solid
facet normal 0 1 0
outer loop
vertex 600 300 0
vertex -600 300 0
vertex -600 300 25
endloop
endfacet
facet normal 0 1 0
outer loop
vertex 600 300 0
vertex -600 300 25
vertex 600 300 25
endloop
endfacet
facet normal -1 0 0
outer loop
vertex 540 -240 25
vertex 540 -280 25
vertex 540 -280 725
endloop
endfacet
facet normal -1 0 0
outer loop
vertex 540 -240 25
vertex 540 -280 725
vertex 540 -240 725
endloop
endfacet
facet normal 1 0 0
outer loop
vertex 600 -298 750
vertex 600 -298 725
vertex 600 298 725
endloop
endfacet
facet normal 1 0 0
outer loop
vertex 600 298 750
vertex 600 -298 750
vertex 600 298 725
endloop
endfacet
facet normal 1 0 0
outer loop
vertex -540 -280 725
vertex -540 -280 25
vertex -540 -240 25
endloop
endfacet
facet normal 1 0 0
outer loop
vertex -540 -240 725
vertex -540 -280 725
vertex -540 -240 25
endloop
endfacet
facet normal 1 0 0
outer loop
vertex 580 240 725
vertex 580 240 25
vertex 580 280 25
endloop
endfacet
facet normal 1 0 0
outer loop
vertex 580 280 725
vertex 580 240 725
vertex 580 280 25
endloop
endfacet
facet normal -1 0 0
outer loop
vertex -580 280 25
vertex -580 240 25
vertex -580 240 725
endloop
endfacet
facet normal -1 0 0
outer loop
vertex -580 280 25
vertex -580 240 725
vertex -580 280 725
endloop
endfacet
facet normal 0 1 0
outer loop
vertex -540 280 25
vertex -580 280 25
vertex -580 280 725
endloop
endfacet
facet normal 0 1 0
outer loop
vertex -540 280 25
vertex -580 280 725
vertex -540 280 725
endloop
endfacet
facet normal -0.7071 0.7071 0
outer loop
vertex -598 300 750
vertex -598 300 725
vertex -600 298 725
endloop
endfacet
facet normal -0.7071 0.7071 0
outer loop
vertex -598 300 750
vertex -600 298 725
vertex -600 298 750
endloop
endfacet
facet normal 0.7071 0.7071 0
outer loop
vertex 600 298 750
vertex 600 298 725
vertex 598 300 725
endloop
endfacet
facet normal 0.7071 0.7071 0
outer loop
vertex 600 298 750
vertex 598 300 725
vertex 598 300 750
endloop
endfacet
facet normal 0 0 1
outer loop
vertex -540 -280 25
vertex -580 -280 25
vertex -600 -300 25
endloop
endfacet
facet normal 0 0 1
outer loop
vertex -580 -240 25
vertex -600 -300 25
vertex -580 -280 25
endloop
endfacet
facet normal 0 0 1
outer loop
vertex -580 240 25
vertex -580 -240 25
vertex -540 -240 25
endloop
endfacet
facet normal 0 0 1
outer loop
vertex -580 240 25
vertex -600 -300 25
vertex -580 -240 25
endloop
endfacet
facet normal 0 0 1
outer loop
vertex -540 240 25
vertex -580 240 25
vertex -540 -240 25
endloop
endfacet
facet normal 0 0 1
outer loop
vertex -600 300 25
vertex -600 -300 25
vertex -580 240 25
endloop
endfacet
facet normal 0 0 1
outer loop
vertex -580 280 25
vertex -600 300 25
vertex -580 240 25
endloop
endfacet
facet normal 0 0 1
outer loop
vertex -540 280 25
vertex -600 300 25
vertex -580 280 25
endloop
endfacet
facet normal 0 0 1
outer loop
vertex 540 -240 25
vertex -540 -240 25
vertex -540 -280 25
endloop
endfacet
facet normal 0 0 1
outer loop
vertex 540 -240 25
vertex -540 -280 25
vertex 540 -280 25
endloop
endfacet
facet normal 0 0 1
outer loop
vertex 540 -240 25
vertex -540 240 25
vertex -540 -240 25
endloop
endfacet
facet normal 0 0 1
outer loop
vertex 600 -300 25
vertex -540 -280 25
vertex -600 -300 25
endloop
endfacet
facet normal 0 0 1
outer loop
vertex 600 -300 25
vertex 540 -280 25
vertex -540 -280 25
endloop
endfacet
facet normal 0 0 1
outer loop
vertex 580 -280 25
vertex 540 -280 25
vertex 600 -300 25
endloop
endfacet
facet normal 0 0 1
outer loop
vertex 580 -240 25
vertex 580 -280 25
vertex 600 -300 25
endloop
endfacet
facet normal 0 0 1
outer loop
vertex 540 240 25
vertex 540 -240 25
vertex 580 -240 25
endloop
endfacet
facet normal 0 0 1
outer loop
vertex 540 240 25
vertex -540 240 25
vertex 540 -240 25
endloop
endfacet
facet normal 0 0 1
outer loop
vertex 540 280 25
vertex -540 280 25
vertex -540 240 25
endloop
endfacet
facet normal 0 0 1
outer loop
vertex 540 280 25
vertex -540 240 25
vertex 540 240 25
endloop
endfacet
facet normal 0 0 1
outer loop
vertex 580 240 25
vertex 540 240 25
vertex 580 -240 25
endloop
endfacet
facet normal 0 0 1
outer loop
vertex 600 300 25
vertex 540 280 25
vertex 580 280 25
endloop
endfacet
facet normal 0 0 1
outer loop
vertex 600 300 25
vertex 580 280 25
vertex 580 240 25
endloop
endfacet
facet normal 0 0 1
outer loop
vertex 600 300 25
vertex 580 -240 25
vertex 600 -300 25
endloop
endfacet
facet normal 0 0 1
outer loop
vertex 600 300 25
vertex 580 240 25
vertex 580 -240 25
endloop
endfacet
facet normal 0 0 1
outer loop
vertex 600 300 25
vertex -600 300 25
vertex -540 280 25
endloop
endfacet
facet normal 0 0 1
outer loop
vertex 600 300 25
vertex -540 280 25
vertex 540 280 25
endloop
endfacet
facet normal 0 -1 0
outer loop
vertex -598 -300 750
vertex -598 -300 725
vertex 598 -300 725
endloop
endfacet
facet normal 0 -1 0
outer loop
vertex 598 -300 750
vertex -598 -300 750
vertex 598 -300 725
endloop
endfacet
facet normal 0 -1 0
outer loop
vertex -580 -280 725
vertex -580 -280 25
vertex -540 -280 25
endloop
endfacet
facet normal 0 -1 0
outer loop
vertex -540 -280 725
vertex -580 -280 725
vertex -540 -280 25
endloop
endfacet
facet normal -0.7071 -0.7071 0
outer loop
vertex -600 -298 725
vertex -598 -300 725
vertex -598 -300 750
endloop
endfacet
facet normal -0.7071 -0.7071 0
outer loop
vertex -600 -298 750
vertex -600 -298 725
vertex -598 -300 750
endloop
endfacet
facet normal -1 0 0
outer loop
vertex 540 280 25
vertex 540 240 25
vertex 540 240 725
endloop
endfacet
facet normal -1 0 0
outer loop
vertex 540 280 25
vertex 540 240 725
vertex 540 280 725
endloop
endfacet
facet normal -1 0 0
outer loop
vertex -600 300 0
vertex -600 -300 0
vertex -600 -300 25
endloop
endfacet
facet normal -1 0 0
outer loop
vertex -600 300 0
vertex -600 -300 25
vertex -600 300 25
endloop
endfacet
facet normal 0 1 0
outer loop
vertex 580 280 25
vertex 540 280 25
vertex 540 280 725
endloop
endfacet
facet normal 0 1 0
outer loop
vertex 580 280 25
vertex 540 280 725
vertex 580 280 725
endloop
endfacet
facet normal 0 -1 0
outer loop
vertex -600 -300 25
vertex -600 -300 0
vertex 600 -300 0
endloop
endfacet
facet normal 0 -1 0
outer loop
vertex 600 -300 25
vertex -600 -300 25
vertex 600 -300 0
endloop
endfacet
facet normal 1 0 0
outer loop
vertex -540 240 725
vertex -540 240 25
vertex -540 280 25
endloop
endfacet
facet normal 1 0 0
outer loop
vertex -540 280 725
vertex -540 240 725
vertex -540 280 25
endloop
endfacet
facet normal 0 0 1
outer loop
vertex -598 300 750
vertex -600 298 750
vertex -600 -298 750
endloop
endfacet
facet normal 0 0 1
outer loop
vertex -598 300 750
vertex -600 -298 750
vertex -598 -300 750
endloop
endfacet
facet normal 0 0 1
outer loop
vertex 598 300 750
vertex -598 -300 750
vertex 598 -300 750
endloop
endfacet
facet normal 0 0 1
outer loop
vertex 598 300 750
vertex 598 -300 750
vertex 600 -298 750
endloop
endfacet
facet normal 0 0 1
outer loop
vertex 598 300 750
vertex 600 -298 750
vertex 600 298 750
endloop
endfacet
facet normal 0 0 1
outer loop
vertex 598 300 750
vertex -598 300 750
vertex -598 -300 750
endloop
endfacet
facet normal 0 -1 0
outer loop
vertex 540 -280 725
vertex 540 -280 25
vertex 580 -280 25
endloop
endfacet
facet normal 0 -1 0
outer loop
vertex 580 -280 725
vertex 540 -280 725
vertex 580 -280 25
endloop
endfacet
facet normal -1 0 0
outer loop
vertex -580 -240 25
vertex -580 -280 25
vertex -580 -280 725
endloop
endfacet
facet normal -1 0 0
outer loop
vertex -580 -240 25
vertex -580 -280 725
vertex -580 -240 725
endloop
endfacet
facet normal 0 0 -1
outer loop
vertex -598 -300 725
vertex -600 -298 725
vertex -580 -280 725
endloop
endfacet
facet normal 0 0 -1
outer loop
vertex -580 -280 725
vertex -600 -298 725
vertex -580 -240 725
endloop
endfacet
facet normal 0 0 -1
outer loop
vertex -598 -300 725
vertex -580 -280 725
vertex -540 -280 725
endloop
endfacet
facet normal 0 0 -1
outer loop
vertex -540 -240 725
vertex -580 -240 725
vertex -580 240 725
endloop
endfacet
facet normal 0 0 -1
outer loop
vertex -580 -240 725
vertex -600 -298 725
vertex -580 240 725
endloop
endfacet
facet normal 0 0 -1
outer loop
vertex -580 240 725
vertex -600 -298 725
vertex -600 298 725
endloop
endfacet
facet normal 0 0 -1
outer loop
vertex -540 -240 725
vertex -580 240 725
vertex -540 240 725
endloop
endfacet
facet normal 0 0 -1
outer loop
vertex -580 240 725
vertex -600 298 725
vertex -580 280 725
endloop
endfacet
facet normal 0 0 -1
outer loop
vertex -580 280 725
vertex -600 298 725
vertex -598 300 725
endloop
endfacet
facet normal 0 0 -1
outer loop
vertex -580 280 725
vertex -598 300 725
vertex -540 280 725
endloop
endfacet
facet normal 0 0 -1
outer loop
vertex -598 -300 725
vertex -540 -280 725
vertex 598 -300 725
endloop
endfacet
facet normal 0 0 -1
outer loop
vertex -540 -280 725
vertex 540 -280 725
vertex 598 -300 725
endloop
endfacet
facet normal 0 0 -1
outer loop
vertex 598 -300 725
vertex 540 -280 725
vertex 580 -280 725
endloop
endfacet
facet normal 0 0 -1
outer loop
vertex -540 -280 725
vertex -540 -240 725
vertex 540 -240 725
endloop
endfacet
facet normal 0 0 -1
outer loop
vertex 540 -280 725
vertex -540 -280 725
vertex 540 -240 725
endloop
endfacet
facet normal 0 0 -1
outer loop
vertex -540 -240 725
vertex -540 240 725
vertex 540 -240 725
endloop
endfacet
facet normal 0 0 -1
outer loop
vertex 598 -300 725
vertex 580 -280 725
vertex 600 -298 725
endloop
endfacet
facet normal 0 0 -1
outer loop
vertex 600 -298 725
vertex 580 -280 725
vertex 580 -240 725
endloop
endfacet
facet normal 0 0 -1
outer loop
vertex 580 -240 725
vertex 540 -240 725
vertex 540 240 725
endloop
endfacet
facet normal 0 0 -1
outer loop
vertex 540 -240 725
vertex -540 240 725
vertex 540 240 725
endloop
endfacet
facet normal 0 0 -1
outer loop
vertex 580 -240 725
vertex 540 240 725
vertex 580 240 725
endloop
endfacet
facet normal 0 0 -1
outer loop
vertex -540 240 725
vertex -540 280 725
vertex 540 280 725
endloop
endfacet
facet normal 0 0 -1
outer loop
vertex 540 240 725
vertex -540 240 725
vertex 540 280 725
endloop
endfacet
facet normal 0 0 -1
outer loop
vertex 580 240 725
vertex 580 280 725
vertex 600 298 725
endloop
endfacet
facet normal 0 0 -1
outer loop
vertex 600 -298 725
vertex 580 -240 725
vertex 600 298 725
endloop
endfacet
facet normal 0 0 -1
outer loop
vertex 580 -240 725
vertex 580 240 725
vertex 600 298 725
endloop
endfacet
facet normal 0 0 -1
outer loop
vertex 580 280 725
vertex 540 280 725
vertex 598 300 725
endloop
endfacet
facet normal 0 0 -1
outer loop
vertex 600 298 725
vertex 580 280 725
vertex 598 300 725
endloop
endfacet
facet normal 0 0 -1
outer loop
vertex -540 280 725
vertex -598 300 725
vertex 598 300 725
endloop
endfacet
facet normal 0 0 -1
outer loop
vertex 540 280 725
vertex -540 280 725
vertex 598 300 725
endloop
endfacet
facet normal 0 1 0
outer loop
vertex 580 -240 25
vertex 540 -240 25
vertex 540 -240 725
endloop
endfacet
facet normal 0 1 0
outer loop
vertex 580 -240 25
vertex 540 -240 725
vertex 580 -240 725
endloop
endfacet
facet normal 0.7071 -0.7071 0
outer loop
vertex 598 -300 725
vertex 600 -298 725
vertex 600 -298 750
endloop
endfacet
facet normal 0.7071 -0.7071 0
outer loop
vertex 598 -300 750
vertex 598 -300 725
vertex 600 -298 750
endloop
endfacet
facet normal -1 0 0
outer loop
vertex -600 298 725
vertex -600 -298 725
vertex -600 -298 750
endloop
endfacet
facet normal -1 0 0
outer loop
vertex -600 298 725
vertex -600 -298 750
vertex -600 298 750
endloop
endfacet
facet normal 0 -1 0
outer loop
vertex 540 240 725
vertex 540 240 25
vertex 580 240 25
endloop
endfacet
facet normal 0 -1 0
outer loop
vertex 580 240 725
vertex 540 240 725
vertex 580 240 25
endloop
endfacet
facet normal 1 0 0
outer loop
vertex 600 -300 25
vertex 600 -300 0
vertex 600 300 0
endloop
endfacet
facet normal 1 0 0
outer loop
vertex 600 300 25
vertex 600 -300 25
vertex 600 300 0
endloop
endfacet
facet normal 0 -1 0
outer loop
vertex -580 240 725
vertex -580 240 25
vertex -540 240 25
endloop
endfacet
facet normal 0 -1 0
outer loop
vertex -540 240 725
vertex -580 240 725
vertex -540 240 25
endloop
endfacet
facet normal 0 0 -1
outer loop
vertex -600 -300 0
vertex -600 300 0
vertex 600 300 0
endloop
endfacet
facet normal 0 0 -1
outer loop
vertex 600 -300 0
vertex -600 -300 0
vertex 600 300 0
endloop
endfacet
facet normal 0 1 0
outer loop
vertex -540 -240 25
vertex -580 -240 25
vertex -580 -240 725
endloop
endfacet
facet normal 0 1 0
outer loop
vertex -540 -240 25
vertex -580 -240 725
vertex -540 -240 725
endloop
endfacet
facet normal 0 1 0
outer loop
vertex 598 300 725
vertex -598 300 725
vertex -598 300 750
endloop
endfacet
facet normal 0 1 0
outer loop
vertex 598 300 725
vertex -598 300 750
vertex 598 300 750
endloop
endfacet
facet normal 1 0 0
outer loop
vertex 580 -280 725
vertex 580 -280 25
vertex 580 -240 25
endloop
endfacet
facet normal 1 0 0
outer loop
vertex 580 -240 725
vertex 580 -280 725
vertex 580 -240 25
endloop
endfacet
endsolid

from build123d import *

# Parameters (mm, degrees)
SKETCH1_W           = 1200
SKETCH1_H           = 600
BOSS_EXTRUDE1_DEPTH = 25
SKETCH2_W           = 40
SKETCH2_H           = 40
BOSS_EXTRUDE2_DEPTH = 725
SKETCH3_W           = 1200
SKETCH3_H           = 600
BOSS_EXTRUDE3_DEPTH = 25
CHAMFER1_SIZE       = 2


with BuildPart() as part:
    # Sketch1 → Boss-Extrude1 (new body)
    with BuildSketch(Plane.XY):
        Rectangle(SKETCH1_W, SKETCH1_H)
    extrude(amount=BOSS_EXTRUDE1_DEPTH)

    # Sketch2 → Boss-Extrude2 (add)
    with BuildSketch(Plane.XY):
        with Locations((-560, -260)):
            Rectangle(SKETCH2_W, SKETCH2_H)
        with Locations((560, -260)):
            Rectangle(SKETCH2_W, SKETCH2_H)
        with Locations((560, 260)):
            Rectangle(SKETCH2_W, SKETCH2_H)
        with Locations((-560, 260)):
            Rectangle(SKETCH2_W, SKETCH2_H)
    extrude(amount=BOSS_EXTRUDE2_DEPTH)

    # Sketch3 → Boss-Extrude3 (add)
    with BuildSketch(Plane.XY.offset(725)):
        Rectangle(SKETCH3_W, SKETCH3_H)
    extrude(amount=BOSS_EXTRUDE3_DEPTH)

    # Chamfer1
    chamfer1_edges = [part.edges().sort_by_distance(p)[0] for p in [
        (600, -300, 737.5),
        (600, 300, 737.5),
        (-600, 300, 737.5),
        (-600, -300, 737.5),
    ]]
    chamfer(chamfer1_edges, length=CHAMFER1_SIZE)


solid = part.part
